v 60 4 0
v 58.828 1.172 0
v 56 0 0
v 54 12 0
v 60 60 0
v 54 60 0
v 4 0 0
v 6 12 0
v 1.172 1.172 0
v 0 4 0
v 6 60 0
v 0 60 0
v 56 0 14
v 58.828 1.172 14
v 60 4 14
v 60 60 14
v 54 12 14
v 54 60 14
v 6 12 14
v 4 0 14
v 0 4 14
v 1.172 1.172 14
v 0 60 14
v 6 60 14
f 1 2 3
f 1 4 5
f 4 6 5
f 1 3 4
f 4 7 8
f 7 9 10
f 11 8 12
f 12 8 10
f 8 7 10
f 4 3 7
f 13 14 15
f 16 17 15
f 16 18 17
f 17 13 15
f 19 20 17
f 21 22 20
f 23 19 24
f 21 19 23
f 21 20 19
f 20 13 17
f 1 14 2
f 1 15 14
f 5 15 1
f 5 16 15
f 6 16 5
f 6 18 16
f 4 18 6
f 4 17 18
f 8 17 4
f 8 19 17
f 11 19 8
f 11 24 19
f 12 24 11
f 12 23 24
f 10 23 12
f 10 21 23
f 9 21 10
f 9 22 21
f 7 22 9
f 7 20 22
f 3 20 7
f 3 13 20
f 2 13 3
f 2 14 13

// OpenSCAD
$fn = 32;

// ----------------------------------------------------------------------
// Heat sink frame: 60 x 60 mm frame, 6 mm walls
// ----------------------------------------------------------------------

// --- parameters (mm) ---
profile_height = 14;      // extrusion height
profile_points = 12;      // points of the closed outline

profile = [[0, 4], [1.172, 1.172], [4, 0], [56, 0], [58.828, 1.172], [60, 4], [60, 60], [54, 60], [54, 12], [6, 12], [6, 60], [0, 60]];  // single closed polygon, 12 points, counter clockwise

// --- the one profile operation ---
linear_extrude(height = profile_height) polygon(points = profile);
